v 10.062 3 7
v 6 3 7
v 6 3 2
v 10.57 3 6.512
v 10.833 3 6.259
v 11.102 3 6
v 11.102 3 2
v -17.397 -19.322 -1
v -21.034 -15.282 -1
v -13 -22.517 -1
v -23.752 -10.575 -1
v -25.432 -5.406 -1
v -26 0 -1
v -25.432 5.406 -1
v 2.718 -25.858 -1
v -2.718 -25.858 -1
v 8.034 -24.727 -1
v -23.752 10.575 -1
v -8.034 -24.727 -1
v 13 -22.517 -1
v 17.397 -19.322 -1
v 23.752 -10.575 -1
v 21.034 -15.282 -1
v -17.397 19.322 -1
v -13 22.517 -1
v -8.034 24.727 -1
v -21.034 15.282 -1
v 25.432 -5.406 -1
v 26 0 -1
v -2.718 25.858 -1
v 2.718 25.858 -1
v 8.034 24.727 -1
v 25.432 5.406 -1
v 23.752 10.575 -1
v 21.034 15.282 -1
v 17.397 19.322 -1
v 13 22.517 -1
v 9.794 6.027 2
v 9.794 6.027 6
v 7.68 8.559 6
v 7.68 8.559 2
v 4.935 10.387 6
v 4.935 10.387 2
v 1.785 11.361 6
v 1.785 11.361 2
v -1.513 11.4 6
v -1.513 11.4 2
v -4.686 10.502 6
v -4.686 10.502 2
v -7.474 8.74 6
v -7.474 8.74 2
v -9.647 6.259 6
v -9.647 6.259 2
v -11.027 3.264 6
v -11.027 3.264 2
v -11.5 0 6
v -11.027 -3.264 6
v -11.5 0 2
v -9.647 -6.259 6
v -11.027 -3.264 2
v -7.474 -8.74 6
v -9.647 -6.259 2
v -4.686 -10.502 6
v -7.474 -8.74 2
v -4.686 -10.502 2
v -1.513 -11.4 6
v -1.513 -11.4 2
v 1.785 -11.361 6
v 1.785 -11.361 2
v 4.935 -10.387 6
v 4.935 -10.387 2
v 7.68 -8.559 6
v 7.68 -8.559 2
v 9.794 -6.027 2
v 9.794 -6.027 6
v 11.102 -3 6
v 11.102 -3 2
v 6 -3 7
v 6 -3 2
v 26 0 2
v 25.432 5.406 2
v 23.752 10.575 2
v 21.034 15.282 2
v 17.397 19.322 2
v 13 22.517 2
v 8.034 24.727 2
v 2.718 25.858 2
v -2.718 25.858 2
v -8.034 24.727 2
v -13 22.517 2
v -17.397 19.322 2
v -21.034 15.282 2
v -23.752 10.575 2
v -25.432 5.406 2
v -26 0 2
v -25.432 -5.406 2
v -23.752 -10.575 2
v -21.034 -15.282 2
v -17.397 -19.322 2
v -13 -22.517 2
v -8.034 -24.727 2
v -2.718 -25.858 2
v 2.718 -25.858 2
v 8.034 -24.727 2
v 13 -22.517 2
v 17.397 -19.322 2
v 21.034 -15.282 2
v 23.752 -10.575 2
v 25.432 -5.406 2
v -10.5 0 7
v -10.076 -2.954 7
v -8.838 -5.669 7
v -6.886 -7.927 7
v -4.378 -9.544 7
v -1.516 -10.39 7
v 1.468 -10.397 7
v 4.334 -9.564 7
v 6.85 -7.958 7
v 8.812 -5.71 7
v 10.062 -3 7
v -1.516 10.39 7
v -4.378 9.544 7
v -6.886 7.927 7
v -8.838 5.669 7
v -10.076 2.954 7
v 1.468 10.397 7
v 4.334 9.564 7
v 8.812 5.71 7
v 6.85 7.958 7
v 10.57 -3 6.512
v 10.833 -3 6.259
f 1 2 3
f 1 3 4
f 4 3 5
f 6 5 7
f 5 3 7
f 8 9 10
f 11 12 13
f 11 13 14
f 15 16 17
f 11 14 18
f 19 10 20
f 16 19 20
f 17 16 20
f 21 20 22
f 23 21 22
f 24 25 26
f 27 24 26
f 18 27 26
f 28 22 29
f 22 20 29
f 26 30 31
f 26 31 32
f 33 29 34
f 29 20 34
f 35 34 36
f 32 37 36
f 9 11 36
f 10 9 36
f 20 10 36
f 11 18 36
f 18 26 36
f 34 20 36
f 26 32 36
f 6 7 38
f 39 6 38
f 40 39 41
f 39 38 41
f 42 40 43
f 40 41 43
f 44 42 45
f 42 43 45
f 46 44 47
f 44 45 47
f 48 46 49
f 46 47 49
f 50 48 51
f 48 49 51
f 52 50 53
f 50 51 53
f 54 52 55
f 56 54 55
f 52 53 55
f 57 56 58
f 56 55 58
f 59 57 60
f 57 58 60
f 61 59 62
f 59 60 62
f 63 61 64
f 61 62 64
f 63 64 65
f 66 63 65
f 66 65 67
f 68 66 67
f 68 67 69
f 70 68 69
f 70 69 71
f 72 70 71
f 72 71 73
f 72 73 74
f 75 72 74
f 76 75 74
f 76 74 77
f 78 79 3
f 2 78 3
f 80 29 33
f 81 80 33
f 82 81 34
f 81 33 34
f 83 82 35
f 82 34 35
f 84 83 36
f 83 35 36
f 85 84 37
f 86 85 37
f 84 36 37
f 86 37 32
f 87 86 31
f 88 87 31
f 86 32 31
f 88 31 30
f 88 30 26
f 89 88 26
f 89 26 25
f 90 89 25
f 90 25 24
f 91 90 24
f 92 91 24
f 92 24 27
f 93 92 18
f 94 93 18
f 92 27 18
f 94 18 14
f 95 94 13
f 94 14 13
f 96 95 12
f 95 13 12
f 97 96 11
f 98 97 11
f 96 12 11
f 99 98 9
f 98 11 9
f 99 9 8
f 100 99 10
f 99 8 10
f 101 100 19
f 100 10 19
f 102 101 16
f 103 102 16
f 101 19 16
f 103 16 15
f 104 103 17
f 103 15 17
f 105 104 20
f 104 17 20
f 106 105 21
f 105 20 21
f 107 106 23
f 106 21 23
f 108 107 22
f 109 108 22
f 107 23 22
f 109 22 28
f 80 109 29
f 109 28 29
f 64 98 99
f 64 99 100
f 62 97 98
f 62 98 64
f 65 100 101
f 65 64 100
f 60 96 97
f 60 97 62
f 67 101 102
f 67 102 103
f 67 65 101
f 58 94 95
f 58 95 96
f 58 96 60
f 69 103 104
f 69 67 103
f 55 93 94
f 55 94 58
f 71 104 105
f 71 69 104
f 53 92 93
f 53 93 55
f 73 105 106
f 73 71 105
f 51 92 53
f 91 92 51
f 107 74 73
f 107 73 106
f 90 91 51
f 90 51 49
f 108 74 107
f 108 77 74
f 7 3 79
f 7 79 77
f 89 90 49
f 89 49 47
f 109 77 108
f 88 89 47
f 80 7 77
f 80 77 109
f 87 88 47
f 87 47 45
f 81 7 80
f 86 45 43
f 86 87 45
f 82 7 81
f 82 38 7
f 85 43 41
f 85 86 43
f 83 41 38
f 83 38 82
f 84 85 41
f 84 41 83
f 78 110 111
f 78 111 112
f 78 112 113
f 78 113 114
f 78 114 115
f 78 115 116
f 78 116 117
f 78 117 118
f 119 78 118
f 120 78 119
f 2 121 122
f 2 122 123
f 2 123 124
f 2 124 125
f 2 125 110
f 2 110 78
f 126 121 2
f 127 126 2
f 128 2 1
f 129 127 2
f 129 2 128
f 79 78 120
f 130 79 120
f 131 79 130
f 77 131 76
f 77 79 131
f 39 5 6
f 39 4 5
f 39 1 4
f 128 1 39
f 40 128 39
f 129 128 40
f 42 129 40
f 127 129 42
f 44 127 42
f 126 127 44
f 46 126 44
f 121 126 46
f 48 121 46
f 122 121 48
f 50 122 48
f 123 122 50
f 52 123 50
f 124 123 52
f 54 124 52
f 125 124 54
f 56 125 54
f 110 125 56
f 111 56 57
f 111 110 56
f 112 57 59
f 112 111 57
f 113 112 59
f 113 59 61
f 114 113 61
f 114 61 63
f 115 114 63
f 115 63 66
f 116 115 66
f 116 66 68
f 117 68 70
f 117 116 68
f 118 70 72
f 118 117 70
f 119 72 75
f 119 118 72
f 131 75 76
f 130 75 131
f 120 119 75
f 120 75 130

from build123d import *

# Parameters (mm, degrees)
BOX211_W                         = 6
BOX211_H                         = 6
BOX211_DEPTH                     = 5
CYLINDER014005814004018007_R     = 26
CYLINDER014005814004018007_DEPTH = 3
CYLINDER014005814004018006_R     = 11.5
CYLINDER014005814004018006_DEPTH = 7
CHAMFER_SIZE                     = 1


with BuildPart() as krychle186:
    # Box211 → Box211 (new body)
    with BuildSketch(Plane(origin=(6, -3, 2), x_dir=(1, 0, 0), z_dir=(0, 0, 1))):
        with Locations((3, 3)):
            Rectangle(BOX211_W, BOX211_H)
    extrude(amount=BOX211_DEPTH)


with BuildPart() as v_lec749:
    # Cylinder014005814004018007 → Cylinder014005814004018007 (new body)
    with BuildSketch(Plane.XY.offset(-1)):
        Circle(CYLINDER014005814004018007_R)
    extrude(amount=CYLINDER014005814004018007_DEPTH)


with BuildPart() as cap2:
    # Cylinder014005814004018006 → Cylinder014005814004018006 (new body)
    with BuildSketch(Plane.XY):
        Circle(CYLINDER014005814004018006_R)
    extrude(amount=CYLINDER014005814004018006_DEPTH)

    # Fusion001089091: union Válec749
    add(v_lec749.part)

    # Cut061098126006: cut Krychle186
    add(krychle186.part, mode=Mode.SUBTRACT)

    # Chamfer
    chamfer_edges = [cap2.edges().sort_by_distance(p)[0] for p in [
        (-11.5, 0, 7),
    ]]
    chamfer(chamfer_edges, length=CHAMFER_SIZE)


solid = cap2.part
